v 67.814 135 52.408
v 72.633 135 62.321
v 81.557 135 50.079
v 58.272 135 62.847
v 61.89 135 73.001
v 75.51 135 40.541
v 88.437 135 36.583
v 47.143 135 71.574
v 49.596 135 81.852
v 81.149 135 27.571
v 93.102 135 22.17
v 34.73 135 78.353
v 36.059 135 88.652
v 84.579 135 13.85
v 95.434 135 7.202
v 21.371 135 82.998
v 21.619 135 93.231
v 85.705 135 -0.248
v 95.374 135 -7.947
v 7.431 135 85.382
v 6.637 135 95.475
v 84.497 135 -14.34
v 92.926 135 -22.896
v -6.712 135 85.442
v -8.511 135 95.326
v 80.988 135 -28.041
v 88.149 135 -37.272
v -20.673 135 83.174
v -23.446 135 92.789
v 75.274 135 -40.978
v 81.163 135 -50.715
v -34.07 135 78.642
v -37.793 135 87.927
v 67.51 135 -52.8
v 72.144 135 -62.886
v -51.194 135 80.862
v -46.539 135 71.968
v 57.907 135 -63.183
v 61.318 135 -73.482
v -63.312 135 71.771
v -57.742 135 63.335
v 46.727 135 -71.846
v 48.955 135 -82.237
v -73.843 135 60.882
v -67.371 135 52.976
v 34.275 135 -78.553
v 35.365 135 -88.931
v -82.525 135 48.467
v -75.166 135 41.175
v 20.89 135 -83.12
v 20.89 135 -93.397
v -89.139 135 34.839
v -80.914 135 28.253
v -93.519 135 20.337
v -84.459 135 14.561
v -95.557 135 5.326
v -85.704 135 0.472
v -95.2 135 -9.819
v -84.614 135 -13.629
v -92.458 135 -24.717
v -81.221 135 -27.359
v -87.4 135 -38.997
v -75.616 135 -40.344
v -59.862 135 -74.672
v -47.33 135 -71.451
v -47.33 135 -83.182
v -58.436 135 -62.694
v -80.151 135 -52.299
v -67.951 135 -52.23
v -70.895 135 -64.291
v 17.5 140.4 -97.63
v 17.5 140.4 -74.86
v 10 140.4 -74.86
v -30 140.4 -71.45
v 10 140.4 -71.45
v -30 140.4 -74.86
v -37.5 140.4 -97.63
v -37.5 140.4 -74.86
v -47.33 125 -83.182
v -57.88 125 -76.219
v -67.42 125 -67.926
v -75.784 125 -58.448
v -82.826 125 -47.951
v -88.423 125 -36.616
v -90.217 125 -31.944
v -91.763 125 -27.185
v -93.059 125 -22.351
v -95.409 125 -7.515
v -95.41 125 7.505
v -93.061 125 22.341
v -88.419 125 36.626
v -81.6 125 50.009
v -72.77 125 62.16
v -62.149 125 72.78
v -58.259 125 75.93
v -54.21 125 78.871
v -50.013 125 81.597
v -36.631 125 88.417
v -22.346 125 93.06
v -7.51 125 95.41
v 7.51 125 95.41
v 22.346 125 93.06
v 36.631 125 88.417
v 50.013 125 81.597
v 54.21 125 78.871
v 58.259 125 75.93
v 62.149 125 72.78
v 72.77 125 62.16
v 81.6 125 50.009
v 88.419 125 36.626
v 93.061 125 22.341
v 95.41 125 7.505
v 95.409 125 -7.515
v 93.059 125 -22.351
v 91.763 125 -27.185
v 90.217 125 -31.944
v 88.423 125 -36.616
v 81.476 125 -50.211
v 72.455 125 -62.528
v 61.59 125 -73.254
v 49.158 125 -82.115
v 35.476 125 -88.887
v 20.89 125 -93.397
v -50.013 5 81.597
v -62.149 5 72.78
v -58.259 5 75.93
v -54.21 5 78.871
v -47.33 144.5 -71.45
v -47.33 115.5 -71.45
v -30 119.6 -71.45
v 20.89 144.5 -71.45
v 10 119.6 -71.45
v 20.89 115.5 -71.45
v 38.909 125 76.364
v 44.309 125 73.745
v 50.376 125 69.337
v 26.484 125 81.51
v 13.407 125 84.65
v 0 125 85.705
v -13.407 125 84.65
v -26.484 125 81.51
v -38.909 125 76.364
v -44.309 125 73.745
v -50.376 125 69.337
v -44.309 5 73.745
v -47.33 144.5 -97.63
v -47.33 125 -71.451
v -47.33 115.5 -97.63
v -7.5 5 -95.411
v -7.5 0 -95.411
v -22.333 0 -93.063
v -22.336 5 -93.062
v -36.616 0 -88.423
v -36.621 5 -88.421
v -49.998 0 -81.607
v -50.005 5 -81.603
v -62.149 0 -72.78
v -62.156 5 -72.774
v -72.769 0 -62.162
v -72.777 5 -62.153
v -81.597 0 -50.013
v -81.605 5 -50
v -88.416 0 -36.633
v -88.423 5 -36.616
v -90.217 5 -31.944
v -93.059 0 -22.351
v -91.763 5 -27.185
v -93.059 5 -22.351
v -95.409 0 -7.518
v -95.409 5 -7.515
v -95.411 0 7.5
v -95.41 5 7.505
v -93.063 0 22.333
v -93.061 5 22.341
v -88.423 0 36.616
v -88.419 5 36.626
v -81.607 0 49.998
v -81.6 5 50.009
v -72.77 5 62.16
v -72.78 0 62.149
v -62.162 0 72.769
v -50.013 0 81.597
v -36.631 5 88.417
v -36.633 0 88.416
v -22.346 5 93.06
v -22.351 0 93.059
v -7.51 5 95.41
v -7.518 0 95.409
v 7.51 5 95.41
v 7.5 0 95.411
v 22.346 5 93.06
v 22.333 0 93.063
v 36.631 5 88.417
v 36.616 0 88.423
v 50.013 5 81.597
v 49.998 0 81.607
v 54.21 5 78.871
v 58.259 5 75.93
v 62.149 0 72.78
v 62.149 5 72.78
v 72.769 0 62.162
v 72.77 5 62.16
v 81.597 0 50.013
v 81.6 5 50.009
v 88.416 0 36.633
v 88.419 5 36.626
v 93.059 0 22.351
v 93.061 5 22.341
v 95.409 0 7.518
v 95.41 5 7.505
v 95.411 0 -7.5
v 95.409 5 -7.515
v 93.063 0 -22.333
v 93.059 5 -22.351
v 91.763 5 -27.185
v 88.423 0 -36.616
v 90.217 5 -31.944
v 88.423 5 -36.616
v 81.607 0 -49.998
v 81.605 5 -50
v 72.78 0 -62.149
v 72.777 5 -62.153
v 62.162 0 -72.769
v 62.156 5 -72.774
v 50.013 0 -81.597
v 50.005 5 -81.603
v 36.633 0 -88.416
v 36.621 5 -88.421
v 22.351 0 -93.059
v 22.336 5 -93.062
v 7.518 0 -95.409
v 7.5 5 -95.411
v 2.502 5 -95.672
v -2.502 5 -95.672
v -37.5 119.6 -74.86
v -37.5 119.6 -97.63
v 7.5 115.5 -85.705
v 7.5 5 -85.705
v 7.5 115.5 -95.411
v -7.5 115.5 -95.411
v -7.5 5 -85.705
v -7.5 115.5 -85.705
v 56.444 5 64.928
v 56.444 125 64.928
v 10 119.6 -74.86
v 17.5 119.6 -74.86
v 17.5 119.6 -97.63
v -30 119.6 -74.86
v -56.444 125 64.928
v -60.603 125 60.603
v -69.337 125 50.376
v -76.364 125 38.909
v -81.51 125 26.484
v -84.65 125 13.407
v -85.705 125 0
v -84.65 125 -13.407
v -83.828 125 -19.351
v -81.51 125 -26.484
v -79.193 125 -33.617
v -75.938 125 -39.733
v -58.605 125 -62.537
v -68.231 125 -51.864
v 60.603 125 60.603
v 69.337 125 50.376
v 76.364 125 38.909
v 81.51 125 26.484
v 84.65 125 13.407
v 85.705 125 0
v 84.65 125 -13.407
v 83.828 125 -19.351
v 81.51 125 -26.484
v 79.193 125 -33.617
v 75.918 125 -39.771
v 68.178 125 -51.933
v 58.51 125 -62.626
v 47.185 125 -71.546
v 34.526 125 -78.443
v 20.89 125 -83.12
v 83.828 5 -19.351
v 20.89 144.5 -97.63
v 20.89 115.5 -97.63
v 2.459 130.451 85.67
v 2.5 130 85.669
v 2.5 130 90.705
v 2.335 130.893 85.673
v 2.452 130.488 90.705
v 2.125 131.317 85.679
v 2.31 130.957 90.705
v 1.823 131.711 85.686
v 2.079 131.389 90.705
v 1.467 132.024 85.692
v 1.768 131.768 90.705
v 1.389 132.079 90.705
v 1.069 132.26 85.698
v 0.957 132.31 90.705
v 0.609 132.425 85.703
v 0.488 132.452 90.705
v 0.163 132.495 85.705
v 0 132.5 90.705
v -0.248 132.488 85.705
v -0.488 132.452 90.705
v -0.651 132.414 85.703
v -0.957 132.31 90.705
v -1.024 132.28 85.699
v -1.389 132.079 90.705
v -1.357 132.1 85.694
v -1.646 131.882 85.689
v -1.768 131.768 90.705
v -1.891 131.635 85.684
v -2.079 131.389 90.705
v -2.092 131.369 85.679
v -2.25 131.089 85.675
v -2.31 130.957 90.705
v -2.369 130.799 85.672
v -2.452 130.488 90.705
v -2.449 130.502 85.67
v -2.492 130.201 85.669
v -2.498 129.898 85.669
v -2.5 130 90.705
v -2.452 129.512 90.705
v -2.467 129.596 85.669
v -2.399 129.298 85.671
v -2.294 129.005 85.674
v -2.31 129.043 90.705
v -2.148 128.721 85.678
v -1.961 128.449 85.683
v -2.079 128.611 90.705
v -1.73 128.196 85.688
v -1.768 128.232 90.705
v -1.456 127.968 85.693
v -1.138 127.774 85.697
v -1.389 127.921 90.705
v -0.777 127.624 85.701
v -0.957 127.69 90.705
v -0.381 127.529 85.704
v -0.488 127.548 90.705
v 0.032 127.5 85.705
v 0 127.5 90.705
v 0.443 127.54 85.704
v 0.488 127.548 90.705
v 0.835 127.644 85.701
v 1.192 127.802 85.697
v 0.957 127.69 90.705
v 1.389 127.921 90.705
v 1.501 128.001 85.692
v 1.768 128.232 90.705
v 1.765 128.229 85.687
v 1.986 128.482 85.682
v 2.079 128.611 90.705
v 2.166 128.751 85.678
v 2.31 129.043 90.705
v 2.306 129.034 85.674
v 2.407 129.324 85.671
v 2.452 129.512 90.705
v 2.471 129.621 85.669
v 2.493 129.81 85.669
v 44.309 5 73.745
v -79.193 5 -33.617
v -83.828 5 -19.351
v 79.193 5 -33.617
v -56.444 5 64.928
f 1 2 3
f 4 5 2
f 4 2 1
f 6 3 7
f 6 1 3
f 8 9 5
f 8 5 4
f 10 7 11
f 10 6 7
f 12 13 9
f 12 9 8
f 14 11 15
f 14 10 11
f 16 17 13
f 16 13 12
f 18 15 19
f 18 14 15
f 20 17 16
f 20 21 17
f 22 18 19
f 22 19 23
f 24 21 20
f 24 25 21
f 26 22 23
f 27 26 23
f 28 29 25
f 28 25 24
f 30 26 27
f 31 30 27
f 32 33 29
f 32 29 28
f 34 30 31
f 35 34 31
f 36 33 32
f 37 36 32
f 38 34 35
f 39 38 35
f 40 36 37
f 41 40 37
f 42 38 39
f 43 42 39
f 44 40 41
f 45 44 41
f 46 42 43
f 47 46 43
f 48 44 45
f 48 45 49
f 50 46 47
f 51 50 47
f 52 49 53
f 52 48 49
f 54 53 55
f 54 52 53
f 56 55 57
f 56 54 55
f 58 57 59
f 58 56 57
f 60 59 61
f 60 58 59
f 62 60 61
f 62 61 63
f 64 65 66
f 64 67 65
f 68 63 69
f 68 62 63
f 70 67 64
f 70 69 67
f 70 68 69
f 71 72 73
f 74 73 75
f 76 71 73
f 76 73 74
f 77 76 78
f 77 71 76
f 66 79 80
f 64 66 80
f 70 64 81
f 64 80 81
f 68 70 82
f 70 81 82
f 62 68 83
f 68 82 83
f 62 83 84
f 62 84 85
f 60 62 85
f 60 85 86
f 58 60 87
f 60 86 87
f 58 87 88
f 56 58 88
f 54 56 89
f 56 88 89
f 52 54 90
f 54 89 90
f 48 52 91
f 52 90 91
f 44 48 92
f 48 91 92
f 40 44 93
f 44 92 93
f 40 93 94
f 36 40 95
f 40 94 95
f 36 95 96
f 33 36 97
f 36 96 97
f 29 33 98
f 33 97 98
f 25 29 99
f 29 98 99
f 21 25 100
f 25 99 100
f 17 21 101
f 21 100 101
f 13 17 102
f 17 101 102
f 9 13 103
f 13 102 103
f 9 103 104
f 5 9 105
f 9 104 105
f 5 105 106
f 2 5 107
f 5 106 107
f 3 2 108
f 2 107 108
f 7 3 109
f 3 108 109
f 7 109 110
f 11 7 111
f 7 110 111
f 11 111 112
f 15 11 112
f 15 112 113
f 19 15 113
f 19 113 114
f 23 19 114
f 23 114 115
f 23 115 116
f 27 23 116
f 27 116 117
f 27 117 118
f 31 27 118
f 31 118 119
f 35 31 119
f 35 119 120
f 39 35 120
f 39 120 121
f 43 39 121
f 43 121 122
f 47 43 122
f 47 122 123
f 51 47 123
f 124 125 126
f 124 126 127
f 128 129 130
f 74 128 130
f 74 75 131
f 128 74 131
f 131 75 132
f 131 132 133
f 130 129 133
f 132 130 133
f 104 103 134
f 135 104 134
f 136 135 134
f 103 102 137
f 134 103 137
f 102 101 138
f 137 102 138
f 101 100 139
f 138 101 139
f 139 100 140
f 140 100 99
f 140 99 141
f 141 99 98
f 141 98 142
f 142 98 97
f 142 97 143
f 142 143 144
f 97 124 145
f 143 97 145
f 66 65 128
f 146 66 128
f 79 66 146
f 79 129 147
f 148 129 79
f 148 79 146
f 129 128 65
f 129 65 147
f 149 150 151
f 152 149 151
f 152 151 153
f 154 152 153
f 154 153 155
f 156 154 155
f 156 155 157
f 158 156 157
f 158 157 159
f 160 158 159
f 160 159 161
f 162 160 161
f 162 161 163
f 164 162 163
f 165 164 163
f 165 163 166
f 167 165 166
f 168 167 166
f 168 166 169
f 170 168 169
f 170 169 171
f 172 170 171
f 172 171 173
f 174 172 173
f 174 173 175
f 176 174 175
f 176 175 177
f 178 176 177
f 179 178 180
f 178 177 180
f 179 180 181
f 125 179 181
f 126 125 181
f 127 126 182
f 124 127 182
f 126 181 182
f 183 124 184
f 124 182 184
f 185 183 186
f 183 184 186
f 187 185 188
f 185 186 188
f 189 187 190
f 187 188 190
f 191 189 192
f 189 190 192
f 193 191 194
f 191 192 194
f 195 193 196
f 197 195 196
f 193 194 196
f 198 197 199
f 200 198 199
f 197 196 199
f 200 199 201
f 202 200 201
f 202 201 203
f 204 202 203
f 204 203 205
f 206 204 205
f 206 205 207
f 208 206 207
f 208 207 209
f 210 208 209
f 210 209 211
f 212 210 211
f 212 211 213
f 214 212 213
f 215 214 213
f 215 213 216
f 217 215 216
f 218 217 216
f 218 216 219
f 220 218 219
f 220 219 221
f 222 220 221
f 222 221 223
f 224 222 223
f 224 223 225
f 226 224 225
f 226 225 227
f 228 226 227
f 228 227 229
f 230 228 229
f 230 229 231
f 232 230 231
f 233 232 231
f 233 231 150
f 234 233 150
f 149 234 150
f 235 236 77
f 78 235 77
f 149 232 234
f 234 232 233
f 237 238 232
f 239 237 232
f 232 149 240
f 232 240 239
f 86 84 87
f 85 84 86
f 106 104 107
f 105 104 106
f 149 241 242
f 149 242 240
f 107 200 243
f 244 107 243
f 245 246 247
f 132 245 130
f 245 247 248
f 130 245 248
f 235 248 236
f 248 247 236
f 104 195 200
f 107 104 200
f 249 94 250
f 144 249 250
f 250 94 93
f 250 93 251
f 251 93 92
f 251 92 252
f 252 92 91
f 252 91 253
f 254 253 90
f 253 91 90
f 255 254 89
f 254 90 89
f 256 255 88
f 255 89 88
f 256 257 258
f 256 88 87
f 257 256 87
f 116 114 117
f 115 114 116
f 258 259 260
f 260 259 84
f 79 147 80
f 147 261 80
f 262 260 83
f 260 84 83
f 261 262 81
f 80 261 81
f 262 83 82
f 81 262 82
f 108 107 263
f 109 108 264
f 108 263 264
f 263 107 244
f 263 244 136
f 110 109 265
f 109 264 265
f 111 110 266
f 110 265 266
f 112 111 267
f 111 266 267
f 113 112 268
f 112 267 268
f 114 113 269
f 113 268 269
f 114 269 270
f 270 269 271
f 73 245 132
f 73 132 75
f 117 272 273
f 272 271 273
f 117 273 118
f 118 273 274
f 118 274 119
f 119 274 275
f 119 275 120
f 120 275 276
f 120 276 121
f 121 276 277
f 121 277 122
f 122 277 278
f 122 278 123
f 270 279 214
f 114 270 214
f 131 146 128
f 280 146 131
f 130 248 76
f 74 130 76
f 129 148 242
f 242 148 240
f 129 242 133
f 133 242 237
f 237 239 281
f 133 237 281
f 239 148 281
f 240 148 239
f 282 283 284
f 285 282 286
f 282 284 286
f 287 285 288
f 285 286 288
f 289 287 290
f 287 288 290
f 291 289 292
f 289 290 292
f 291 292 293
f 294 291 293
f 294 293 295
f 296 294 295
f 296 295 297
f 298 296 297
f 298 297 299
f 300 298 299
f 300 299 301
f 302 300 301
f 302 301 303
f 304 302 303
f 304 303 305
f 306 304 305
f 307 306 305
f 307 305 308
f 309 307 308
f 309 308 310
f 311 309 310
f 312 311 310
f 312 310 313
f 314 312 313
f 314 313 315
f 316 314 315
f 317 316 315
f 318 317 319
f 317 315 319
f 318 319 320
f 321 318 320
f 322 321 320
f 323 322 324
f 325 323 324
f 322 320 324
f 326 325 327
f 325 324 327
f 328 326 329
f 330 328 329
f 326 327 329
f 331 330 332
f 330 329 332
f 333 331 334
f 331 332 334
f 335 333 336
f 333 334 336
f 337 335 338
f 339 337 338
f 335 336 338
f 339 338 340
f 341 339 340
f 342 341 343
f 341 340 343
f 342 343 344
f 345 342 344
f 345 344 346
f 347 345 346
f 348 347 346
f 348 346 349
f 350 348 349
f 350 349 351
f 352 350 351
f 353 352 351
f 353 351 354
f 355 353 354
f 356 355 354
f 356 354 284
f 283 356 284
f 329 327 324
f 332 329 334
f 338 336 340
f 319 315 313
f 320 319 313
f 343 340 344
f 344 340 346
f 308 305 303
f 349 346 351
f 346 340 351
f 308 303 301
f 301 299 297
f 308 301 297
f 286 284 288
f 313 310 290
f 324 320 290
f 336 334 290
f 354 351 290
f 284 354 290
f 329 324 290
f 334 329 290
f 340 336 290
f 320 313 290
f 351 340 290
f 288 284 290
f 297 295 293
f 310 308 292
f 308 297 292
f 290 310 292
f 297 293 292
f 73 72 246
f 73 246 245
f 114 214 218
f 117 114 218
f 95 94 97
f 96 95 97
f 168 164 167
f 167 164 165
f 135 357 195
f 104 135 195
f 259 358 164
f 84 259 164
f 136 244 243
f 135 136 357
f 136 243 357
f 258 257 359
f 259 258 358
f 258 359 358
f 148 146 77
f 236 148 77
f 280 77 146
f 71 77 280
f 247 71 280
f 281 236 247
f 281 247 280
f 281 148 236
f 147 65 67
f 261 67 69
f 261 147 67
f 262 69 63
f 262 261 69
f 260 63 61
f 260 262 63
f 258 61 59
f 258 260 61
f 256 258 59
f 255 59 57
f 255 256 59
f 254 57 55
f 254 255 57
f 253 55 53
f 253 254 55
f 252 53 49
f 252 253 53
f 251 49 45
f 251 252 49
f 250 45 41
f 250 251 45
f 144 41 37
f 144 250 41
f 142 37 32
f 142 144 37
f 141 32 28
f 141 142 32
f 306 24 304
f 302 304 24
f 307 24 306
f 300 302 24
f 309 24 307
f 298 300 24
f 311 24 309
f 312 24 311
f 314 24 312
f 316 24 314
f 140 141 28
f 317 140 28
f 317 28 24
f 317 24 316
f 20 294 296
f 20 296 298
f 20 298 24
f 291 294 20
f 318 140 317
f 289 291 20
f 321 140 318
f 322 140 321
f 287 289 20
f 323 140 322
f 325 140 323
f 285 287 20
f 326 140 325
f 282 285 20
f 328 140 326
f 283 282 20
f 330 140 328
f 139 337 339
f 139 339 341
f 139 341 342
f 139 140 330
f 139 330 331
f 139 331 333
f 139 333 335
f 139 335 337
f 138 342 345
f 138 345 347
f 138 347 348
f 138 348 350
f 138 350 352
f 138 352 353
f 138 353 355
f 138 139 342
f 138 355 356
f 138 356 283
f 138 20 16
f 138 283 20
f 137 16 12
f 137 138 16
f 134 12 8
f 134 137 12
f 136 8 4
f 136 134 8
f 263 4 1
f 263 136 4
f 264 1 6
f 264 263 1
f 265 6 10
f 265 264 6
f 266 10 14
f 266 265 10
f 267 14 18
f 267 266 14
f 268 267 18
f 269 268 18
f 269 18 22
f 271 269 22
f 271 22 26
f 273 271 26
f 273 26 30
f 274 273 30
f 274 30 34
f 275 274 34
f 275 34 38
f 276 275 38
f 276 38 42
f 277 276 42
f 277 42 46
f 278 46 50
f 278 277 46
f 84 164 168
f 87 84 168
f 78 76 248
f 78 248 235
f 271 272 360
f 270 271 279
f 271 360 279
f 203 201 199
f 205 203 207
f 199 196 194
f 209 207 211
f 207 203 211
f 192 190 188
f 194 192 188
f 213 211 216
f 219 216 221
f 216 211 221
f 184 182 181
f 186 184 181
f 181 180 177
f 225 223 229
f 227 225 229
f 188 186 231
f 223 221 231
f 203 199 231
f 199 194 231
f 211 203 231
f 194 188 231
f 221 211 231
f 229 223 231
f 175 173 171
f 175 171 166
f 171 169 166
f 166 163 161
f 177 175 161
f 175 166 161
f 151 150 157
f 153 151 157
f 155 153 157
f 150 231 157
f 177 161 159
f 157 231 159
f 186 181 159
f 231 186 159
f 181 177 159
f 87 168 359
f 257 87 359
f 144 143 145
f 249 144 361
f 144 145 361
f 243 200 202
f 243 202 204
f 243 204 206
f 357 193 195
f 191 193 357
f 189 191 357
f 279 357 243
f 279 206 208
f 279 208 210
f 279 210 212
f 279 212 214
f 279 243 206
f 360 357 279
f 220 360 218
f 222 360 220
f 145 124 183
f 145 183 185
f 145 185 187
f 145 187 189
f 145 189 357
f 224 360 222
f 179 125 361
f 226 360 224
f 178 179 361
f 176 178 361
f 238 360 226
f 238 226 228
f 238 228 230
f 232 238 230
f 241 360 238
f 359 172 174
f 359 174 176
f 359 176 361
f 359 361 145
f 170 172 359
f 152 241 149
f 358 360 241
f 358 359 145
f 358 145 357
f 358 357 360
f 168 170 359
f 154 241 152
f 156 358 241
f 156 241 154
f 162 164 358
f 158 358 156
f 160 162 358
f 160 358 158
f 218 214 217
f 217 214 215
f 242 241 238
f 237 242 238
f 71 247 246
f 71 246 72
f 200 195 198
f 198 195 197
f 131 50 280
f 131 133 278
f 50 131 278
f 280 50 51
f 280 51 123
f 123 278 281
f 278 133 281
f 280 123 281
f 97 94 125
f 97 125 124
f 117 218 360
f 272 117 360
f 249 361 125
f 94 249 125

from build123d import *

# Parameters (mm, degrees)
SKETCH1_R                = 95.705
BOSS_EXTRUDE1_DEPTH      = 5
SKETCH2_W                = 15
SKETCH2_H                = 9.705675634
BOSS_EXTRUDE2_DEPTH      = 120
SKETCH3_R                = 95.705
SKETCH3_R_2              = 85.705
BOSS_EXTRUDE3_DEPTH      = 10
BOSS_EXTRUDE4_DEPTH      = 14.5
BOSS_EXTRUDE4_DEPTH_BACK = 14.5
SKETCH4_W                = 68.22
SKETCH4_H                = 26.18
SKETCH5_W                = 55
SKETCH5_H                = 20.8
CUT_EXTRUDE1_DEPTH       = 22.77
SKETCH6_W                = 40
SKETCH6_H                = 20.8
CUT_EXTRUDE2_DEPTH       = 5.77
SKETCH8_R                = 2.5
CUT_EXTRUDE3_DEPTH       = 5.77


with BuildPart() as part:
    # Sketch1 → Boss-Extrude1 (new body)
    with BuildSketch(Plane(origin=(0, 0, 0), x_dir=(1, 0, 0), z_dir=(0, 1, 0))):
        Circle(SKETCH1_R)
    extrude(amount=BOSS_EXTRUDE1_DEPTH)

    # Sketch2 → Boss-Extrude2 (add)
    with BuildSketch(Plane(origin=(0, 5, 0), x_dir=(1, 0, 0), z_dir=(0, 1, 0))):
        Polygon((83.827926187, 19.351377631), (93.058572244, 22.350596344), (88.423317328, 36.616444088), (79.192671271, 33.617225375), align=None)
        with Locations((0, 90.557837817)):
            Rectangle(SKETCH2_W, SKETCH2_H)
        Polygon((44.30850759, -73.745190895), (50.013360591, -81.597247425), (62.148615507, -72.780468641), (56.443762506, -64.928412111), align=None)
        Polygon((-56.443762506, -64.928412111), (-62.148615507, -72.780468641), (-50.013360591, -81.597247425), (-44.30850759, -73.745190895), align=None)
        Polygon((-79.192671271, 33.617225375), (-88.423317328, 36.616444088), (-93.058572244, 22.350596344), (-83.827926187, 19.351377631), align=None)
    extrude(amount=BOSS_EXTRUDE2_DEPTH)

    # Sketch3 → Boss-Extrude3 (add)
    with BuildSketch(Plane(origin=(0, 125, 0), x_dir=(1, 0, 0), z_dir=(0, 1, 0))):
        Circle(SKETCH3_R)
        Circle(SKETCH3_R_2, mode=Mode.SUBTRACT)
    extrude(amount=BOSS_EXTRUDE3_DEPTH)

    # Sketch4 → Boss-Extrude4 (add, two sides: drawn at the far end of the back side and taken through both)
    with BuildSketch(Plane(origin=(0, 130, 0), x_dir=(1, 0, 0), z_dir=(0, 1, 0)).offset(-BOSS_EXTRUDE4_DEPTH_BACK)):
        with Locations((-13.22, 84.54)):
            Rectangle(SKETCH4_W, SKETCH4_H)
    extrude(amount=BOSS_EXTRUDE4_DEPTH + BOSS_EXTRUDE4_DEPTH_BACK)

    # Sketch5 → Cut-Extrude1 (cut)
    with BuildSketch(Plane(origin=(0, 0, -97.63), x_dir=(-1, 0, 0), z_dir=(0, 0, -1))):
        with Locations((10, 130)):
            Rectangle(SKETCH5_W, SKETCH5_H)
    extrude(amount=-CUT_EXTRUDE1_DEPTH, mode=Mode.SUBTRACT)

    # Sketch6 → Cut-Extrude2 (cut)
    with BuildSketch(Plane(origin=(0, 0, -74.86), x_dir=(-1, 0, 0), z_dir=(0, 0, -1))):
        with Locations((10, 130)):
            Rectangle(SKETCH6_W, SKETCH6_H)
    extrude(amount=-CUT_EXTRUDE2_DEPTH, mode=Mode.SUBTRACT)

    # Sketch8 → Cut-Extrude3 (cut)
    with BuildSketch(Plane.XY.offset(90.705)):
        with Locations((0, 130)):
            Circle(SKETCH8_R)
    extrude(amount=-CUT_EXTRUDE3_DEPTH, mode=Mode.SUBTRACT)


solid = part.part
